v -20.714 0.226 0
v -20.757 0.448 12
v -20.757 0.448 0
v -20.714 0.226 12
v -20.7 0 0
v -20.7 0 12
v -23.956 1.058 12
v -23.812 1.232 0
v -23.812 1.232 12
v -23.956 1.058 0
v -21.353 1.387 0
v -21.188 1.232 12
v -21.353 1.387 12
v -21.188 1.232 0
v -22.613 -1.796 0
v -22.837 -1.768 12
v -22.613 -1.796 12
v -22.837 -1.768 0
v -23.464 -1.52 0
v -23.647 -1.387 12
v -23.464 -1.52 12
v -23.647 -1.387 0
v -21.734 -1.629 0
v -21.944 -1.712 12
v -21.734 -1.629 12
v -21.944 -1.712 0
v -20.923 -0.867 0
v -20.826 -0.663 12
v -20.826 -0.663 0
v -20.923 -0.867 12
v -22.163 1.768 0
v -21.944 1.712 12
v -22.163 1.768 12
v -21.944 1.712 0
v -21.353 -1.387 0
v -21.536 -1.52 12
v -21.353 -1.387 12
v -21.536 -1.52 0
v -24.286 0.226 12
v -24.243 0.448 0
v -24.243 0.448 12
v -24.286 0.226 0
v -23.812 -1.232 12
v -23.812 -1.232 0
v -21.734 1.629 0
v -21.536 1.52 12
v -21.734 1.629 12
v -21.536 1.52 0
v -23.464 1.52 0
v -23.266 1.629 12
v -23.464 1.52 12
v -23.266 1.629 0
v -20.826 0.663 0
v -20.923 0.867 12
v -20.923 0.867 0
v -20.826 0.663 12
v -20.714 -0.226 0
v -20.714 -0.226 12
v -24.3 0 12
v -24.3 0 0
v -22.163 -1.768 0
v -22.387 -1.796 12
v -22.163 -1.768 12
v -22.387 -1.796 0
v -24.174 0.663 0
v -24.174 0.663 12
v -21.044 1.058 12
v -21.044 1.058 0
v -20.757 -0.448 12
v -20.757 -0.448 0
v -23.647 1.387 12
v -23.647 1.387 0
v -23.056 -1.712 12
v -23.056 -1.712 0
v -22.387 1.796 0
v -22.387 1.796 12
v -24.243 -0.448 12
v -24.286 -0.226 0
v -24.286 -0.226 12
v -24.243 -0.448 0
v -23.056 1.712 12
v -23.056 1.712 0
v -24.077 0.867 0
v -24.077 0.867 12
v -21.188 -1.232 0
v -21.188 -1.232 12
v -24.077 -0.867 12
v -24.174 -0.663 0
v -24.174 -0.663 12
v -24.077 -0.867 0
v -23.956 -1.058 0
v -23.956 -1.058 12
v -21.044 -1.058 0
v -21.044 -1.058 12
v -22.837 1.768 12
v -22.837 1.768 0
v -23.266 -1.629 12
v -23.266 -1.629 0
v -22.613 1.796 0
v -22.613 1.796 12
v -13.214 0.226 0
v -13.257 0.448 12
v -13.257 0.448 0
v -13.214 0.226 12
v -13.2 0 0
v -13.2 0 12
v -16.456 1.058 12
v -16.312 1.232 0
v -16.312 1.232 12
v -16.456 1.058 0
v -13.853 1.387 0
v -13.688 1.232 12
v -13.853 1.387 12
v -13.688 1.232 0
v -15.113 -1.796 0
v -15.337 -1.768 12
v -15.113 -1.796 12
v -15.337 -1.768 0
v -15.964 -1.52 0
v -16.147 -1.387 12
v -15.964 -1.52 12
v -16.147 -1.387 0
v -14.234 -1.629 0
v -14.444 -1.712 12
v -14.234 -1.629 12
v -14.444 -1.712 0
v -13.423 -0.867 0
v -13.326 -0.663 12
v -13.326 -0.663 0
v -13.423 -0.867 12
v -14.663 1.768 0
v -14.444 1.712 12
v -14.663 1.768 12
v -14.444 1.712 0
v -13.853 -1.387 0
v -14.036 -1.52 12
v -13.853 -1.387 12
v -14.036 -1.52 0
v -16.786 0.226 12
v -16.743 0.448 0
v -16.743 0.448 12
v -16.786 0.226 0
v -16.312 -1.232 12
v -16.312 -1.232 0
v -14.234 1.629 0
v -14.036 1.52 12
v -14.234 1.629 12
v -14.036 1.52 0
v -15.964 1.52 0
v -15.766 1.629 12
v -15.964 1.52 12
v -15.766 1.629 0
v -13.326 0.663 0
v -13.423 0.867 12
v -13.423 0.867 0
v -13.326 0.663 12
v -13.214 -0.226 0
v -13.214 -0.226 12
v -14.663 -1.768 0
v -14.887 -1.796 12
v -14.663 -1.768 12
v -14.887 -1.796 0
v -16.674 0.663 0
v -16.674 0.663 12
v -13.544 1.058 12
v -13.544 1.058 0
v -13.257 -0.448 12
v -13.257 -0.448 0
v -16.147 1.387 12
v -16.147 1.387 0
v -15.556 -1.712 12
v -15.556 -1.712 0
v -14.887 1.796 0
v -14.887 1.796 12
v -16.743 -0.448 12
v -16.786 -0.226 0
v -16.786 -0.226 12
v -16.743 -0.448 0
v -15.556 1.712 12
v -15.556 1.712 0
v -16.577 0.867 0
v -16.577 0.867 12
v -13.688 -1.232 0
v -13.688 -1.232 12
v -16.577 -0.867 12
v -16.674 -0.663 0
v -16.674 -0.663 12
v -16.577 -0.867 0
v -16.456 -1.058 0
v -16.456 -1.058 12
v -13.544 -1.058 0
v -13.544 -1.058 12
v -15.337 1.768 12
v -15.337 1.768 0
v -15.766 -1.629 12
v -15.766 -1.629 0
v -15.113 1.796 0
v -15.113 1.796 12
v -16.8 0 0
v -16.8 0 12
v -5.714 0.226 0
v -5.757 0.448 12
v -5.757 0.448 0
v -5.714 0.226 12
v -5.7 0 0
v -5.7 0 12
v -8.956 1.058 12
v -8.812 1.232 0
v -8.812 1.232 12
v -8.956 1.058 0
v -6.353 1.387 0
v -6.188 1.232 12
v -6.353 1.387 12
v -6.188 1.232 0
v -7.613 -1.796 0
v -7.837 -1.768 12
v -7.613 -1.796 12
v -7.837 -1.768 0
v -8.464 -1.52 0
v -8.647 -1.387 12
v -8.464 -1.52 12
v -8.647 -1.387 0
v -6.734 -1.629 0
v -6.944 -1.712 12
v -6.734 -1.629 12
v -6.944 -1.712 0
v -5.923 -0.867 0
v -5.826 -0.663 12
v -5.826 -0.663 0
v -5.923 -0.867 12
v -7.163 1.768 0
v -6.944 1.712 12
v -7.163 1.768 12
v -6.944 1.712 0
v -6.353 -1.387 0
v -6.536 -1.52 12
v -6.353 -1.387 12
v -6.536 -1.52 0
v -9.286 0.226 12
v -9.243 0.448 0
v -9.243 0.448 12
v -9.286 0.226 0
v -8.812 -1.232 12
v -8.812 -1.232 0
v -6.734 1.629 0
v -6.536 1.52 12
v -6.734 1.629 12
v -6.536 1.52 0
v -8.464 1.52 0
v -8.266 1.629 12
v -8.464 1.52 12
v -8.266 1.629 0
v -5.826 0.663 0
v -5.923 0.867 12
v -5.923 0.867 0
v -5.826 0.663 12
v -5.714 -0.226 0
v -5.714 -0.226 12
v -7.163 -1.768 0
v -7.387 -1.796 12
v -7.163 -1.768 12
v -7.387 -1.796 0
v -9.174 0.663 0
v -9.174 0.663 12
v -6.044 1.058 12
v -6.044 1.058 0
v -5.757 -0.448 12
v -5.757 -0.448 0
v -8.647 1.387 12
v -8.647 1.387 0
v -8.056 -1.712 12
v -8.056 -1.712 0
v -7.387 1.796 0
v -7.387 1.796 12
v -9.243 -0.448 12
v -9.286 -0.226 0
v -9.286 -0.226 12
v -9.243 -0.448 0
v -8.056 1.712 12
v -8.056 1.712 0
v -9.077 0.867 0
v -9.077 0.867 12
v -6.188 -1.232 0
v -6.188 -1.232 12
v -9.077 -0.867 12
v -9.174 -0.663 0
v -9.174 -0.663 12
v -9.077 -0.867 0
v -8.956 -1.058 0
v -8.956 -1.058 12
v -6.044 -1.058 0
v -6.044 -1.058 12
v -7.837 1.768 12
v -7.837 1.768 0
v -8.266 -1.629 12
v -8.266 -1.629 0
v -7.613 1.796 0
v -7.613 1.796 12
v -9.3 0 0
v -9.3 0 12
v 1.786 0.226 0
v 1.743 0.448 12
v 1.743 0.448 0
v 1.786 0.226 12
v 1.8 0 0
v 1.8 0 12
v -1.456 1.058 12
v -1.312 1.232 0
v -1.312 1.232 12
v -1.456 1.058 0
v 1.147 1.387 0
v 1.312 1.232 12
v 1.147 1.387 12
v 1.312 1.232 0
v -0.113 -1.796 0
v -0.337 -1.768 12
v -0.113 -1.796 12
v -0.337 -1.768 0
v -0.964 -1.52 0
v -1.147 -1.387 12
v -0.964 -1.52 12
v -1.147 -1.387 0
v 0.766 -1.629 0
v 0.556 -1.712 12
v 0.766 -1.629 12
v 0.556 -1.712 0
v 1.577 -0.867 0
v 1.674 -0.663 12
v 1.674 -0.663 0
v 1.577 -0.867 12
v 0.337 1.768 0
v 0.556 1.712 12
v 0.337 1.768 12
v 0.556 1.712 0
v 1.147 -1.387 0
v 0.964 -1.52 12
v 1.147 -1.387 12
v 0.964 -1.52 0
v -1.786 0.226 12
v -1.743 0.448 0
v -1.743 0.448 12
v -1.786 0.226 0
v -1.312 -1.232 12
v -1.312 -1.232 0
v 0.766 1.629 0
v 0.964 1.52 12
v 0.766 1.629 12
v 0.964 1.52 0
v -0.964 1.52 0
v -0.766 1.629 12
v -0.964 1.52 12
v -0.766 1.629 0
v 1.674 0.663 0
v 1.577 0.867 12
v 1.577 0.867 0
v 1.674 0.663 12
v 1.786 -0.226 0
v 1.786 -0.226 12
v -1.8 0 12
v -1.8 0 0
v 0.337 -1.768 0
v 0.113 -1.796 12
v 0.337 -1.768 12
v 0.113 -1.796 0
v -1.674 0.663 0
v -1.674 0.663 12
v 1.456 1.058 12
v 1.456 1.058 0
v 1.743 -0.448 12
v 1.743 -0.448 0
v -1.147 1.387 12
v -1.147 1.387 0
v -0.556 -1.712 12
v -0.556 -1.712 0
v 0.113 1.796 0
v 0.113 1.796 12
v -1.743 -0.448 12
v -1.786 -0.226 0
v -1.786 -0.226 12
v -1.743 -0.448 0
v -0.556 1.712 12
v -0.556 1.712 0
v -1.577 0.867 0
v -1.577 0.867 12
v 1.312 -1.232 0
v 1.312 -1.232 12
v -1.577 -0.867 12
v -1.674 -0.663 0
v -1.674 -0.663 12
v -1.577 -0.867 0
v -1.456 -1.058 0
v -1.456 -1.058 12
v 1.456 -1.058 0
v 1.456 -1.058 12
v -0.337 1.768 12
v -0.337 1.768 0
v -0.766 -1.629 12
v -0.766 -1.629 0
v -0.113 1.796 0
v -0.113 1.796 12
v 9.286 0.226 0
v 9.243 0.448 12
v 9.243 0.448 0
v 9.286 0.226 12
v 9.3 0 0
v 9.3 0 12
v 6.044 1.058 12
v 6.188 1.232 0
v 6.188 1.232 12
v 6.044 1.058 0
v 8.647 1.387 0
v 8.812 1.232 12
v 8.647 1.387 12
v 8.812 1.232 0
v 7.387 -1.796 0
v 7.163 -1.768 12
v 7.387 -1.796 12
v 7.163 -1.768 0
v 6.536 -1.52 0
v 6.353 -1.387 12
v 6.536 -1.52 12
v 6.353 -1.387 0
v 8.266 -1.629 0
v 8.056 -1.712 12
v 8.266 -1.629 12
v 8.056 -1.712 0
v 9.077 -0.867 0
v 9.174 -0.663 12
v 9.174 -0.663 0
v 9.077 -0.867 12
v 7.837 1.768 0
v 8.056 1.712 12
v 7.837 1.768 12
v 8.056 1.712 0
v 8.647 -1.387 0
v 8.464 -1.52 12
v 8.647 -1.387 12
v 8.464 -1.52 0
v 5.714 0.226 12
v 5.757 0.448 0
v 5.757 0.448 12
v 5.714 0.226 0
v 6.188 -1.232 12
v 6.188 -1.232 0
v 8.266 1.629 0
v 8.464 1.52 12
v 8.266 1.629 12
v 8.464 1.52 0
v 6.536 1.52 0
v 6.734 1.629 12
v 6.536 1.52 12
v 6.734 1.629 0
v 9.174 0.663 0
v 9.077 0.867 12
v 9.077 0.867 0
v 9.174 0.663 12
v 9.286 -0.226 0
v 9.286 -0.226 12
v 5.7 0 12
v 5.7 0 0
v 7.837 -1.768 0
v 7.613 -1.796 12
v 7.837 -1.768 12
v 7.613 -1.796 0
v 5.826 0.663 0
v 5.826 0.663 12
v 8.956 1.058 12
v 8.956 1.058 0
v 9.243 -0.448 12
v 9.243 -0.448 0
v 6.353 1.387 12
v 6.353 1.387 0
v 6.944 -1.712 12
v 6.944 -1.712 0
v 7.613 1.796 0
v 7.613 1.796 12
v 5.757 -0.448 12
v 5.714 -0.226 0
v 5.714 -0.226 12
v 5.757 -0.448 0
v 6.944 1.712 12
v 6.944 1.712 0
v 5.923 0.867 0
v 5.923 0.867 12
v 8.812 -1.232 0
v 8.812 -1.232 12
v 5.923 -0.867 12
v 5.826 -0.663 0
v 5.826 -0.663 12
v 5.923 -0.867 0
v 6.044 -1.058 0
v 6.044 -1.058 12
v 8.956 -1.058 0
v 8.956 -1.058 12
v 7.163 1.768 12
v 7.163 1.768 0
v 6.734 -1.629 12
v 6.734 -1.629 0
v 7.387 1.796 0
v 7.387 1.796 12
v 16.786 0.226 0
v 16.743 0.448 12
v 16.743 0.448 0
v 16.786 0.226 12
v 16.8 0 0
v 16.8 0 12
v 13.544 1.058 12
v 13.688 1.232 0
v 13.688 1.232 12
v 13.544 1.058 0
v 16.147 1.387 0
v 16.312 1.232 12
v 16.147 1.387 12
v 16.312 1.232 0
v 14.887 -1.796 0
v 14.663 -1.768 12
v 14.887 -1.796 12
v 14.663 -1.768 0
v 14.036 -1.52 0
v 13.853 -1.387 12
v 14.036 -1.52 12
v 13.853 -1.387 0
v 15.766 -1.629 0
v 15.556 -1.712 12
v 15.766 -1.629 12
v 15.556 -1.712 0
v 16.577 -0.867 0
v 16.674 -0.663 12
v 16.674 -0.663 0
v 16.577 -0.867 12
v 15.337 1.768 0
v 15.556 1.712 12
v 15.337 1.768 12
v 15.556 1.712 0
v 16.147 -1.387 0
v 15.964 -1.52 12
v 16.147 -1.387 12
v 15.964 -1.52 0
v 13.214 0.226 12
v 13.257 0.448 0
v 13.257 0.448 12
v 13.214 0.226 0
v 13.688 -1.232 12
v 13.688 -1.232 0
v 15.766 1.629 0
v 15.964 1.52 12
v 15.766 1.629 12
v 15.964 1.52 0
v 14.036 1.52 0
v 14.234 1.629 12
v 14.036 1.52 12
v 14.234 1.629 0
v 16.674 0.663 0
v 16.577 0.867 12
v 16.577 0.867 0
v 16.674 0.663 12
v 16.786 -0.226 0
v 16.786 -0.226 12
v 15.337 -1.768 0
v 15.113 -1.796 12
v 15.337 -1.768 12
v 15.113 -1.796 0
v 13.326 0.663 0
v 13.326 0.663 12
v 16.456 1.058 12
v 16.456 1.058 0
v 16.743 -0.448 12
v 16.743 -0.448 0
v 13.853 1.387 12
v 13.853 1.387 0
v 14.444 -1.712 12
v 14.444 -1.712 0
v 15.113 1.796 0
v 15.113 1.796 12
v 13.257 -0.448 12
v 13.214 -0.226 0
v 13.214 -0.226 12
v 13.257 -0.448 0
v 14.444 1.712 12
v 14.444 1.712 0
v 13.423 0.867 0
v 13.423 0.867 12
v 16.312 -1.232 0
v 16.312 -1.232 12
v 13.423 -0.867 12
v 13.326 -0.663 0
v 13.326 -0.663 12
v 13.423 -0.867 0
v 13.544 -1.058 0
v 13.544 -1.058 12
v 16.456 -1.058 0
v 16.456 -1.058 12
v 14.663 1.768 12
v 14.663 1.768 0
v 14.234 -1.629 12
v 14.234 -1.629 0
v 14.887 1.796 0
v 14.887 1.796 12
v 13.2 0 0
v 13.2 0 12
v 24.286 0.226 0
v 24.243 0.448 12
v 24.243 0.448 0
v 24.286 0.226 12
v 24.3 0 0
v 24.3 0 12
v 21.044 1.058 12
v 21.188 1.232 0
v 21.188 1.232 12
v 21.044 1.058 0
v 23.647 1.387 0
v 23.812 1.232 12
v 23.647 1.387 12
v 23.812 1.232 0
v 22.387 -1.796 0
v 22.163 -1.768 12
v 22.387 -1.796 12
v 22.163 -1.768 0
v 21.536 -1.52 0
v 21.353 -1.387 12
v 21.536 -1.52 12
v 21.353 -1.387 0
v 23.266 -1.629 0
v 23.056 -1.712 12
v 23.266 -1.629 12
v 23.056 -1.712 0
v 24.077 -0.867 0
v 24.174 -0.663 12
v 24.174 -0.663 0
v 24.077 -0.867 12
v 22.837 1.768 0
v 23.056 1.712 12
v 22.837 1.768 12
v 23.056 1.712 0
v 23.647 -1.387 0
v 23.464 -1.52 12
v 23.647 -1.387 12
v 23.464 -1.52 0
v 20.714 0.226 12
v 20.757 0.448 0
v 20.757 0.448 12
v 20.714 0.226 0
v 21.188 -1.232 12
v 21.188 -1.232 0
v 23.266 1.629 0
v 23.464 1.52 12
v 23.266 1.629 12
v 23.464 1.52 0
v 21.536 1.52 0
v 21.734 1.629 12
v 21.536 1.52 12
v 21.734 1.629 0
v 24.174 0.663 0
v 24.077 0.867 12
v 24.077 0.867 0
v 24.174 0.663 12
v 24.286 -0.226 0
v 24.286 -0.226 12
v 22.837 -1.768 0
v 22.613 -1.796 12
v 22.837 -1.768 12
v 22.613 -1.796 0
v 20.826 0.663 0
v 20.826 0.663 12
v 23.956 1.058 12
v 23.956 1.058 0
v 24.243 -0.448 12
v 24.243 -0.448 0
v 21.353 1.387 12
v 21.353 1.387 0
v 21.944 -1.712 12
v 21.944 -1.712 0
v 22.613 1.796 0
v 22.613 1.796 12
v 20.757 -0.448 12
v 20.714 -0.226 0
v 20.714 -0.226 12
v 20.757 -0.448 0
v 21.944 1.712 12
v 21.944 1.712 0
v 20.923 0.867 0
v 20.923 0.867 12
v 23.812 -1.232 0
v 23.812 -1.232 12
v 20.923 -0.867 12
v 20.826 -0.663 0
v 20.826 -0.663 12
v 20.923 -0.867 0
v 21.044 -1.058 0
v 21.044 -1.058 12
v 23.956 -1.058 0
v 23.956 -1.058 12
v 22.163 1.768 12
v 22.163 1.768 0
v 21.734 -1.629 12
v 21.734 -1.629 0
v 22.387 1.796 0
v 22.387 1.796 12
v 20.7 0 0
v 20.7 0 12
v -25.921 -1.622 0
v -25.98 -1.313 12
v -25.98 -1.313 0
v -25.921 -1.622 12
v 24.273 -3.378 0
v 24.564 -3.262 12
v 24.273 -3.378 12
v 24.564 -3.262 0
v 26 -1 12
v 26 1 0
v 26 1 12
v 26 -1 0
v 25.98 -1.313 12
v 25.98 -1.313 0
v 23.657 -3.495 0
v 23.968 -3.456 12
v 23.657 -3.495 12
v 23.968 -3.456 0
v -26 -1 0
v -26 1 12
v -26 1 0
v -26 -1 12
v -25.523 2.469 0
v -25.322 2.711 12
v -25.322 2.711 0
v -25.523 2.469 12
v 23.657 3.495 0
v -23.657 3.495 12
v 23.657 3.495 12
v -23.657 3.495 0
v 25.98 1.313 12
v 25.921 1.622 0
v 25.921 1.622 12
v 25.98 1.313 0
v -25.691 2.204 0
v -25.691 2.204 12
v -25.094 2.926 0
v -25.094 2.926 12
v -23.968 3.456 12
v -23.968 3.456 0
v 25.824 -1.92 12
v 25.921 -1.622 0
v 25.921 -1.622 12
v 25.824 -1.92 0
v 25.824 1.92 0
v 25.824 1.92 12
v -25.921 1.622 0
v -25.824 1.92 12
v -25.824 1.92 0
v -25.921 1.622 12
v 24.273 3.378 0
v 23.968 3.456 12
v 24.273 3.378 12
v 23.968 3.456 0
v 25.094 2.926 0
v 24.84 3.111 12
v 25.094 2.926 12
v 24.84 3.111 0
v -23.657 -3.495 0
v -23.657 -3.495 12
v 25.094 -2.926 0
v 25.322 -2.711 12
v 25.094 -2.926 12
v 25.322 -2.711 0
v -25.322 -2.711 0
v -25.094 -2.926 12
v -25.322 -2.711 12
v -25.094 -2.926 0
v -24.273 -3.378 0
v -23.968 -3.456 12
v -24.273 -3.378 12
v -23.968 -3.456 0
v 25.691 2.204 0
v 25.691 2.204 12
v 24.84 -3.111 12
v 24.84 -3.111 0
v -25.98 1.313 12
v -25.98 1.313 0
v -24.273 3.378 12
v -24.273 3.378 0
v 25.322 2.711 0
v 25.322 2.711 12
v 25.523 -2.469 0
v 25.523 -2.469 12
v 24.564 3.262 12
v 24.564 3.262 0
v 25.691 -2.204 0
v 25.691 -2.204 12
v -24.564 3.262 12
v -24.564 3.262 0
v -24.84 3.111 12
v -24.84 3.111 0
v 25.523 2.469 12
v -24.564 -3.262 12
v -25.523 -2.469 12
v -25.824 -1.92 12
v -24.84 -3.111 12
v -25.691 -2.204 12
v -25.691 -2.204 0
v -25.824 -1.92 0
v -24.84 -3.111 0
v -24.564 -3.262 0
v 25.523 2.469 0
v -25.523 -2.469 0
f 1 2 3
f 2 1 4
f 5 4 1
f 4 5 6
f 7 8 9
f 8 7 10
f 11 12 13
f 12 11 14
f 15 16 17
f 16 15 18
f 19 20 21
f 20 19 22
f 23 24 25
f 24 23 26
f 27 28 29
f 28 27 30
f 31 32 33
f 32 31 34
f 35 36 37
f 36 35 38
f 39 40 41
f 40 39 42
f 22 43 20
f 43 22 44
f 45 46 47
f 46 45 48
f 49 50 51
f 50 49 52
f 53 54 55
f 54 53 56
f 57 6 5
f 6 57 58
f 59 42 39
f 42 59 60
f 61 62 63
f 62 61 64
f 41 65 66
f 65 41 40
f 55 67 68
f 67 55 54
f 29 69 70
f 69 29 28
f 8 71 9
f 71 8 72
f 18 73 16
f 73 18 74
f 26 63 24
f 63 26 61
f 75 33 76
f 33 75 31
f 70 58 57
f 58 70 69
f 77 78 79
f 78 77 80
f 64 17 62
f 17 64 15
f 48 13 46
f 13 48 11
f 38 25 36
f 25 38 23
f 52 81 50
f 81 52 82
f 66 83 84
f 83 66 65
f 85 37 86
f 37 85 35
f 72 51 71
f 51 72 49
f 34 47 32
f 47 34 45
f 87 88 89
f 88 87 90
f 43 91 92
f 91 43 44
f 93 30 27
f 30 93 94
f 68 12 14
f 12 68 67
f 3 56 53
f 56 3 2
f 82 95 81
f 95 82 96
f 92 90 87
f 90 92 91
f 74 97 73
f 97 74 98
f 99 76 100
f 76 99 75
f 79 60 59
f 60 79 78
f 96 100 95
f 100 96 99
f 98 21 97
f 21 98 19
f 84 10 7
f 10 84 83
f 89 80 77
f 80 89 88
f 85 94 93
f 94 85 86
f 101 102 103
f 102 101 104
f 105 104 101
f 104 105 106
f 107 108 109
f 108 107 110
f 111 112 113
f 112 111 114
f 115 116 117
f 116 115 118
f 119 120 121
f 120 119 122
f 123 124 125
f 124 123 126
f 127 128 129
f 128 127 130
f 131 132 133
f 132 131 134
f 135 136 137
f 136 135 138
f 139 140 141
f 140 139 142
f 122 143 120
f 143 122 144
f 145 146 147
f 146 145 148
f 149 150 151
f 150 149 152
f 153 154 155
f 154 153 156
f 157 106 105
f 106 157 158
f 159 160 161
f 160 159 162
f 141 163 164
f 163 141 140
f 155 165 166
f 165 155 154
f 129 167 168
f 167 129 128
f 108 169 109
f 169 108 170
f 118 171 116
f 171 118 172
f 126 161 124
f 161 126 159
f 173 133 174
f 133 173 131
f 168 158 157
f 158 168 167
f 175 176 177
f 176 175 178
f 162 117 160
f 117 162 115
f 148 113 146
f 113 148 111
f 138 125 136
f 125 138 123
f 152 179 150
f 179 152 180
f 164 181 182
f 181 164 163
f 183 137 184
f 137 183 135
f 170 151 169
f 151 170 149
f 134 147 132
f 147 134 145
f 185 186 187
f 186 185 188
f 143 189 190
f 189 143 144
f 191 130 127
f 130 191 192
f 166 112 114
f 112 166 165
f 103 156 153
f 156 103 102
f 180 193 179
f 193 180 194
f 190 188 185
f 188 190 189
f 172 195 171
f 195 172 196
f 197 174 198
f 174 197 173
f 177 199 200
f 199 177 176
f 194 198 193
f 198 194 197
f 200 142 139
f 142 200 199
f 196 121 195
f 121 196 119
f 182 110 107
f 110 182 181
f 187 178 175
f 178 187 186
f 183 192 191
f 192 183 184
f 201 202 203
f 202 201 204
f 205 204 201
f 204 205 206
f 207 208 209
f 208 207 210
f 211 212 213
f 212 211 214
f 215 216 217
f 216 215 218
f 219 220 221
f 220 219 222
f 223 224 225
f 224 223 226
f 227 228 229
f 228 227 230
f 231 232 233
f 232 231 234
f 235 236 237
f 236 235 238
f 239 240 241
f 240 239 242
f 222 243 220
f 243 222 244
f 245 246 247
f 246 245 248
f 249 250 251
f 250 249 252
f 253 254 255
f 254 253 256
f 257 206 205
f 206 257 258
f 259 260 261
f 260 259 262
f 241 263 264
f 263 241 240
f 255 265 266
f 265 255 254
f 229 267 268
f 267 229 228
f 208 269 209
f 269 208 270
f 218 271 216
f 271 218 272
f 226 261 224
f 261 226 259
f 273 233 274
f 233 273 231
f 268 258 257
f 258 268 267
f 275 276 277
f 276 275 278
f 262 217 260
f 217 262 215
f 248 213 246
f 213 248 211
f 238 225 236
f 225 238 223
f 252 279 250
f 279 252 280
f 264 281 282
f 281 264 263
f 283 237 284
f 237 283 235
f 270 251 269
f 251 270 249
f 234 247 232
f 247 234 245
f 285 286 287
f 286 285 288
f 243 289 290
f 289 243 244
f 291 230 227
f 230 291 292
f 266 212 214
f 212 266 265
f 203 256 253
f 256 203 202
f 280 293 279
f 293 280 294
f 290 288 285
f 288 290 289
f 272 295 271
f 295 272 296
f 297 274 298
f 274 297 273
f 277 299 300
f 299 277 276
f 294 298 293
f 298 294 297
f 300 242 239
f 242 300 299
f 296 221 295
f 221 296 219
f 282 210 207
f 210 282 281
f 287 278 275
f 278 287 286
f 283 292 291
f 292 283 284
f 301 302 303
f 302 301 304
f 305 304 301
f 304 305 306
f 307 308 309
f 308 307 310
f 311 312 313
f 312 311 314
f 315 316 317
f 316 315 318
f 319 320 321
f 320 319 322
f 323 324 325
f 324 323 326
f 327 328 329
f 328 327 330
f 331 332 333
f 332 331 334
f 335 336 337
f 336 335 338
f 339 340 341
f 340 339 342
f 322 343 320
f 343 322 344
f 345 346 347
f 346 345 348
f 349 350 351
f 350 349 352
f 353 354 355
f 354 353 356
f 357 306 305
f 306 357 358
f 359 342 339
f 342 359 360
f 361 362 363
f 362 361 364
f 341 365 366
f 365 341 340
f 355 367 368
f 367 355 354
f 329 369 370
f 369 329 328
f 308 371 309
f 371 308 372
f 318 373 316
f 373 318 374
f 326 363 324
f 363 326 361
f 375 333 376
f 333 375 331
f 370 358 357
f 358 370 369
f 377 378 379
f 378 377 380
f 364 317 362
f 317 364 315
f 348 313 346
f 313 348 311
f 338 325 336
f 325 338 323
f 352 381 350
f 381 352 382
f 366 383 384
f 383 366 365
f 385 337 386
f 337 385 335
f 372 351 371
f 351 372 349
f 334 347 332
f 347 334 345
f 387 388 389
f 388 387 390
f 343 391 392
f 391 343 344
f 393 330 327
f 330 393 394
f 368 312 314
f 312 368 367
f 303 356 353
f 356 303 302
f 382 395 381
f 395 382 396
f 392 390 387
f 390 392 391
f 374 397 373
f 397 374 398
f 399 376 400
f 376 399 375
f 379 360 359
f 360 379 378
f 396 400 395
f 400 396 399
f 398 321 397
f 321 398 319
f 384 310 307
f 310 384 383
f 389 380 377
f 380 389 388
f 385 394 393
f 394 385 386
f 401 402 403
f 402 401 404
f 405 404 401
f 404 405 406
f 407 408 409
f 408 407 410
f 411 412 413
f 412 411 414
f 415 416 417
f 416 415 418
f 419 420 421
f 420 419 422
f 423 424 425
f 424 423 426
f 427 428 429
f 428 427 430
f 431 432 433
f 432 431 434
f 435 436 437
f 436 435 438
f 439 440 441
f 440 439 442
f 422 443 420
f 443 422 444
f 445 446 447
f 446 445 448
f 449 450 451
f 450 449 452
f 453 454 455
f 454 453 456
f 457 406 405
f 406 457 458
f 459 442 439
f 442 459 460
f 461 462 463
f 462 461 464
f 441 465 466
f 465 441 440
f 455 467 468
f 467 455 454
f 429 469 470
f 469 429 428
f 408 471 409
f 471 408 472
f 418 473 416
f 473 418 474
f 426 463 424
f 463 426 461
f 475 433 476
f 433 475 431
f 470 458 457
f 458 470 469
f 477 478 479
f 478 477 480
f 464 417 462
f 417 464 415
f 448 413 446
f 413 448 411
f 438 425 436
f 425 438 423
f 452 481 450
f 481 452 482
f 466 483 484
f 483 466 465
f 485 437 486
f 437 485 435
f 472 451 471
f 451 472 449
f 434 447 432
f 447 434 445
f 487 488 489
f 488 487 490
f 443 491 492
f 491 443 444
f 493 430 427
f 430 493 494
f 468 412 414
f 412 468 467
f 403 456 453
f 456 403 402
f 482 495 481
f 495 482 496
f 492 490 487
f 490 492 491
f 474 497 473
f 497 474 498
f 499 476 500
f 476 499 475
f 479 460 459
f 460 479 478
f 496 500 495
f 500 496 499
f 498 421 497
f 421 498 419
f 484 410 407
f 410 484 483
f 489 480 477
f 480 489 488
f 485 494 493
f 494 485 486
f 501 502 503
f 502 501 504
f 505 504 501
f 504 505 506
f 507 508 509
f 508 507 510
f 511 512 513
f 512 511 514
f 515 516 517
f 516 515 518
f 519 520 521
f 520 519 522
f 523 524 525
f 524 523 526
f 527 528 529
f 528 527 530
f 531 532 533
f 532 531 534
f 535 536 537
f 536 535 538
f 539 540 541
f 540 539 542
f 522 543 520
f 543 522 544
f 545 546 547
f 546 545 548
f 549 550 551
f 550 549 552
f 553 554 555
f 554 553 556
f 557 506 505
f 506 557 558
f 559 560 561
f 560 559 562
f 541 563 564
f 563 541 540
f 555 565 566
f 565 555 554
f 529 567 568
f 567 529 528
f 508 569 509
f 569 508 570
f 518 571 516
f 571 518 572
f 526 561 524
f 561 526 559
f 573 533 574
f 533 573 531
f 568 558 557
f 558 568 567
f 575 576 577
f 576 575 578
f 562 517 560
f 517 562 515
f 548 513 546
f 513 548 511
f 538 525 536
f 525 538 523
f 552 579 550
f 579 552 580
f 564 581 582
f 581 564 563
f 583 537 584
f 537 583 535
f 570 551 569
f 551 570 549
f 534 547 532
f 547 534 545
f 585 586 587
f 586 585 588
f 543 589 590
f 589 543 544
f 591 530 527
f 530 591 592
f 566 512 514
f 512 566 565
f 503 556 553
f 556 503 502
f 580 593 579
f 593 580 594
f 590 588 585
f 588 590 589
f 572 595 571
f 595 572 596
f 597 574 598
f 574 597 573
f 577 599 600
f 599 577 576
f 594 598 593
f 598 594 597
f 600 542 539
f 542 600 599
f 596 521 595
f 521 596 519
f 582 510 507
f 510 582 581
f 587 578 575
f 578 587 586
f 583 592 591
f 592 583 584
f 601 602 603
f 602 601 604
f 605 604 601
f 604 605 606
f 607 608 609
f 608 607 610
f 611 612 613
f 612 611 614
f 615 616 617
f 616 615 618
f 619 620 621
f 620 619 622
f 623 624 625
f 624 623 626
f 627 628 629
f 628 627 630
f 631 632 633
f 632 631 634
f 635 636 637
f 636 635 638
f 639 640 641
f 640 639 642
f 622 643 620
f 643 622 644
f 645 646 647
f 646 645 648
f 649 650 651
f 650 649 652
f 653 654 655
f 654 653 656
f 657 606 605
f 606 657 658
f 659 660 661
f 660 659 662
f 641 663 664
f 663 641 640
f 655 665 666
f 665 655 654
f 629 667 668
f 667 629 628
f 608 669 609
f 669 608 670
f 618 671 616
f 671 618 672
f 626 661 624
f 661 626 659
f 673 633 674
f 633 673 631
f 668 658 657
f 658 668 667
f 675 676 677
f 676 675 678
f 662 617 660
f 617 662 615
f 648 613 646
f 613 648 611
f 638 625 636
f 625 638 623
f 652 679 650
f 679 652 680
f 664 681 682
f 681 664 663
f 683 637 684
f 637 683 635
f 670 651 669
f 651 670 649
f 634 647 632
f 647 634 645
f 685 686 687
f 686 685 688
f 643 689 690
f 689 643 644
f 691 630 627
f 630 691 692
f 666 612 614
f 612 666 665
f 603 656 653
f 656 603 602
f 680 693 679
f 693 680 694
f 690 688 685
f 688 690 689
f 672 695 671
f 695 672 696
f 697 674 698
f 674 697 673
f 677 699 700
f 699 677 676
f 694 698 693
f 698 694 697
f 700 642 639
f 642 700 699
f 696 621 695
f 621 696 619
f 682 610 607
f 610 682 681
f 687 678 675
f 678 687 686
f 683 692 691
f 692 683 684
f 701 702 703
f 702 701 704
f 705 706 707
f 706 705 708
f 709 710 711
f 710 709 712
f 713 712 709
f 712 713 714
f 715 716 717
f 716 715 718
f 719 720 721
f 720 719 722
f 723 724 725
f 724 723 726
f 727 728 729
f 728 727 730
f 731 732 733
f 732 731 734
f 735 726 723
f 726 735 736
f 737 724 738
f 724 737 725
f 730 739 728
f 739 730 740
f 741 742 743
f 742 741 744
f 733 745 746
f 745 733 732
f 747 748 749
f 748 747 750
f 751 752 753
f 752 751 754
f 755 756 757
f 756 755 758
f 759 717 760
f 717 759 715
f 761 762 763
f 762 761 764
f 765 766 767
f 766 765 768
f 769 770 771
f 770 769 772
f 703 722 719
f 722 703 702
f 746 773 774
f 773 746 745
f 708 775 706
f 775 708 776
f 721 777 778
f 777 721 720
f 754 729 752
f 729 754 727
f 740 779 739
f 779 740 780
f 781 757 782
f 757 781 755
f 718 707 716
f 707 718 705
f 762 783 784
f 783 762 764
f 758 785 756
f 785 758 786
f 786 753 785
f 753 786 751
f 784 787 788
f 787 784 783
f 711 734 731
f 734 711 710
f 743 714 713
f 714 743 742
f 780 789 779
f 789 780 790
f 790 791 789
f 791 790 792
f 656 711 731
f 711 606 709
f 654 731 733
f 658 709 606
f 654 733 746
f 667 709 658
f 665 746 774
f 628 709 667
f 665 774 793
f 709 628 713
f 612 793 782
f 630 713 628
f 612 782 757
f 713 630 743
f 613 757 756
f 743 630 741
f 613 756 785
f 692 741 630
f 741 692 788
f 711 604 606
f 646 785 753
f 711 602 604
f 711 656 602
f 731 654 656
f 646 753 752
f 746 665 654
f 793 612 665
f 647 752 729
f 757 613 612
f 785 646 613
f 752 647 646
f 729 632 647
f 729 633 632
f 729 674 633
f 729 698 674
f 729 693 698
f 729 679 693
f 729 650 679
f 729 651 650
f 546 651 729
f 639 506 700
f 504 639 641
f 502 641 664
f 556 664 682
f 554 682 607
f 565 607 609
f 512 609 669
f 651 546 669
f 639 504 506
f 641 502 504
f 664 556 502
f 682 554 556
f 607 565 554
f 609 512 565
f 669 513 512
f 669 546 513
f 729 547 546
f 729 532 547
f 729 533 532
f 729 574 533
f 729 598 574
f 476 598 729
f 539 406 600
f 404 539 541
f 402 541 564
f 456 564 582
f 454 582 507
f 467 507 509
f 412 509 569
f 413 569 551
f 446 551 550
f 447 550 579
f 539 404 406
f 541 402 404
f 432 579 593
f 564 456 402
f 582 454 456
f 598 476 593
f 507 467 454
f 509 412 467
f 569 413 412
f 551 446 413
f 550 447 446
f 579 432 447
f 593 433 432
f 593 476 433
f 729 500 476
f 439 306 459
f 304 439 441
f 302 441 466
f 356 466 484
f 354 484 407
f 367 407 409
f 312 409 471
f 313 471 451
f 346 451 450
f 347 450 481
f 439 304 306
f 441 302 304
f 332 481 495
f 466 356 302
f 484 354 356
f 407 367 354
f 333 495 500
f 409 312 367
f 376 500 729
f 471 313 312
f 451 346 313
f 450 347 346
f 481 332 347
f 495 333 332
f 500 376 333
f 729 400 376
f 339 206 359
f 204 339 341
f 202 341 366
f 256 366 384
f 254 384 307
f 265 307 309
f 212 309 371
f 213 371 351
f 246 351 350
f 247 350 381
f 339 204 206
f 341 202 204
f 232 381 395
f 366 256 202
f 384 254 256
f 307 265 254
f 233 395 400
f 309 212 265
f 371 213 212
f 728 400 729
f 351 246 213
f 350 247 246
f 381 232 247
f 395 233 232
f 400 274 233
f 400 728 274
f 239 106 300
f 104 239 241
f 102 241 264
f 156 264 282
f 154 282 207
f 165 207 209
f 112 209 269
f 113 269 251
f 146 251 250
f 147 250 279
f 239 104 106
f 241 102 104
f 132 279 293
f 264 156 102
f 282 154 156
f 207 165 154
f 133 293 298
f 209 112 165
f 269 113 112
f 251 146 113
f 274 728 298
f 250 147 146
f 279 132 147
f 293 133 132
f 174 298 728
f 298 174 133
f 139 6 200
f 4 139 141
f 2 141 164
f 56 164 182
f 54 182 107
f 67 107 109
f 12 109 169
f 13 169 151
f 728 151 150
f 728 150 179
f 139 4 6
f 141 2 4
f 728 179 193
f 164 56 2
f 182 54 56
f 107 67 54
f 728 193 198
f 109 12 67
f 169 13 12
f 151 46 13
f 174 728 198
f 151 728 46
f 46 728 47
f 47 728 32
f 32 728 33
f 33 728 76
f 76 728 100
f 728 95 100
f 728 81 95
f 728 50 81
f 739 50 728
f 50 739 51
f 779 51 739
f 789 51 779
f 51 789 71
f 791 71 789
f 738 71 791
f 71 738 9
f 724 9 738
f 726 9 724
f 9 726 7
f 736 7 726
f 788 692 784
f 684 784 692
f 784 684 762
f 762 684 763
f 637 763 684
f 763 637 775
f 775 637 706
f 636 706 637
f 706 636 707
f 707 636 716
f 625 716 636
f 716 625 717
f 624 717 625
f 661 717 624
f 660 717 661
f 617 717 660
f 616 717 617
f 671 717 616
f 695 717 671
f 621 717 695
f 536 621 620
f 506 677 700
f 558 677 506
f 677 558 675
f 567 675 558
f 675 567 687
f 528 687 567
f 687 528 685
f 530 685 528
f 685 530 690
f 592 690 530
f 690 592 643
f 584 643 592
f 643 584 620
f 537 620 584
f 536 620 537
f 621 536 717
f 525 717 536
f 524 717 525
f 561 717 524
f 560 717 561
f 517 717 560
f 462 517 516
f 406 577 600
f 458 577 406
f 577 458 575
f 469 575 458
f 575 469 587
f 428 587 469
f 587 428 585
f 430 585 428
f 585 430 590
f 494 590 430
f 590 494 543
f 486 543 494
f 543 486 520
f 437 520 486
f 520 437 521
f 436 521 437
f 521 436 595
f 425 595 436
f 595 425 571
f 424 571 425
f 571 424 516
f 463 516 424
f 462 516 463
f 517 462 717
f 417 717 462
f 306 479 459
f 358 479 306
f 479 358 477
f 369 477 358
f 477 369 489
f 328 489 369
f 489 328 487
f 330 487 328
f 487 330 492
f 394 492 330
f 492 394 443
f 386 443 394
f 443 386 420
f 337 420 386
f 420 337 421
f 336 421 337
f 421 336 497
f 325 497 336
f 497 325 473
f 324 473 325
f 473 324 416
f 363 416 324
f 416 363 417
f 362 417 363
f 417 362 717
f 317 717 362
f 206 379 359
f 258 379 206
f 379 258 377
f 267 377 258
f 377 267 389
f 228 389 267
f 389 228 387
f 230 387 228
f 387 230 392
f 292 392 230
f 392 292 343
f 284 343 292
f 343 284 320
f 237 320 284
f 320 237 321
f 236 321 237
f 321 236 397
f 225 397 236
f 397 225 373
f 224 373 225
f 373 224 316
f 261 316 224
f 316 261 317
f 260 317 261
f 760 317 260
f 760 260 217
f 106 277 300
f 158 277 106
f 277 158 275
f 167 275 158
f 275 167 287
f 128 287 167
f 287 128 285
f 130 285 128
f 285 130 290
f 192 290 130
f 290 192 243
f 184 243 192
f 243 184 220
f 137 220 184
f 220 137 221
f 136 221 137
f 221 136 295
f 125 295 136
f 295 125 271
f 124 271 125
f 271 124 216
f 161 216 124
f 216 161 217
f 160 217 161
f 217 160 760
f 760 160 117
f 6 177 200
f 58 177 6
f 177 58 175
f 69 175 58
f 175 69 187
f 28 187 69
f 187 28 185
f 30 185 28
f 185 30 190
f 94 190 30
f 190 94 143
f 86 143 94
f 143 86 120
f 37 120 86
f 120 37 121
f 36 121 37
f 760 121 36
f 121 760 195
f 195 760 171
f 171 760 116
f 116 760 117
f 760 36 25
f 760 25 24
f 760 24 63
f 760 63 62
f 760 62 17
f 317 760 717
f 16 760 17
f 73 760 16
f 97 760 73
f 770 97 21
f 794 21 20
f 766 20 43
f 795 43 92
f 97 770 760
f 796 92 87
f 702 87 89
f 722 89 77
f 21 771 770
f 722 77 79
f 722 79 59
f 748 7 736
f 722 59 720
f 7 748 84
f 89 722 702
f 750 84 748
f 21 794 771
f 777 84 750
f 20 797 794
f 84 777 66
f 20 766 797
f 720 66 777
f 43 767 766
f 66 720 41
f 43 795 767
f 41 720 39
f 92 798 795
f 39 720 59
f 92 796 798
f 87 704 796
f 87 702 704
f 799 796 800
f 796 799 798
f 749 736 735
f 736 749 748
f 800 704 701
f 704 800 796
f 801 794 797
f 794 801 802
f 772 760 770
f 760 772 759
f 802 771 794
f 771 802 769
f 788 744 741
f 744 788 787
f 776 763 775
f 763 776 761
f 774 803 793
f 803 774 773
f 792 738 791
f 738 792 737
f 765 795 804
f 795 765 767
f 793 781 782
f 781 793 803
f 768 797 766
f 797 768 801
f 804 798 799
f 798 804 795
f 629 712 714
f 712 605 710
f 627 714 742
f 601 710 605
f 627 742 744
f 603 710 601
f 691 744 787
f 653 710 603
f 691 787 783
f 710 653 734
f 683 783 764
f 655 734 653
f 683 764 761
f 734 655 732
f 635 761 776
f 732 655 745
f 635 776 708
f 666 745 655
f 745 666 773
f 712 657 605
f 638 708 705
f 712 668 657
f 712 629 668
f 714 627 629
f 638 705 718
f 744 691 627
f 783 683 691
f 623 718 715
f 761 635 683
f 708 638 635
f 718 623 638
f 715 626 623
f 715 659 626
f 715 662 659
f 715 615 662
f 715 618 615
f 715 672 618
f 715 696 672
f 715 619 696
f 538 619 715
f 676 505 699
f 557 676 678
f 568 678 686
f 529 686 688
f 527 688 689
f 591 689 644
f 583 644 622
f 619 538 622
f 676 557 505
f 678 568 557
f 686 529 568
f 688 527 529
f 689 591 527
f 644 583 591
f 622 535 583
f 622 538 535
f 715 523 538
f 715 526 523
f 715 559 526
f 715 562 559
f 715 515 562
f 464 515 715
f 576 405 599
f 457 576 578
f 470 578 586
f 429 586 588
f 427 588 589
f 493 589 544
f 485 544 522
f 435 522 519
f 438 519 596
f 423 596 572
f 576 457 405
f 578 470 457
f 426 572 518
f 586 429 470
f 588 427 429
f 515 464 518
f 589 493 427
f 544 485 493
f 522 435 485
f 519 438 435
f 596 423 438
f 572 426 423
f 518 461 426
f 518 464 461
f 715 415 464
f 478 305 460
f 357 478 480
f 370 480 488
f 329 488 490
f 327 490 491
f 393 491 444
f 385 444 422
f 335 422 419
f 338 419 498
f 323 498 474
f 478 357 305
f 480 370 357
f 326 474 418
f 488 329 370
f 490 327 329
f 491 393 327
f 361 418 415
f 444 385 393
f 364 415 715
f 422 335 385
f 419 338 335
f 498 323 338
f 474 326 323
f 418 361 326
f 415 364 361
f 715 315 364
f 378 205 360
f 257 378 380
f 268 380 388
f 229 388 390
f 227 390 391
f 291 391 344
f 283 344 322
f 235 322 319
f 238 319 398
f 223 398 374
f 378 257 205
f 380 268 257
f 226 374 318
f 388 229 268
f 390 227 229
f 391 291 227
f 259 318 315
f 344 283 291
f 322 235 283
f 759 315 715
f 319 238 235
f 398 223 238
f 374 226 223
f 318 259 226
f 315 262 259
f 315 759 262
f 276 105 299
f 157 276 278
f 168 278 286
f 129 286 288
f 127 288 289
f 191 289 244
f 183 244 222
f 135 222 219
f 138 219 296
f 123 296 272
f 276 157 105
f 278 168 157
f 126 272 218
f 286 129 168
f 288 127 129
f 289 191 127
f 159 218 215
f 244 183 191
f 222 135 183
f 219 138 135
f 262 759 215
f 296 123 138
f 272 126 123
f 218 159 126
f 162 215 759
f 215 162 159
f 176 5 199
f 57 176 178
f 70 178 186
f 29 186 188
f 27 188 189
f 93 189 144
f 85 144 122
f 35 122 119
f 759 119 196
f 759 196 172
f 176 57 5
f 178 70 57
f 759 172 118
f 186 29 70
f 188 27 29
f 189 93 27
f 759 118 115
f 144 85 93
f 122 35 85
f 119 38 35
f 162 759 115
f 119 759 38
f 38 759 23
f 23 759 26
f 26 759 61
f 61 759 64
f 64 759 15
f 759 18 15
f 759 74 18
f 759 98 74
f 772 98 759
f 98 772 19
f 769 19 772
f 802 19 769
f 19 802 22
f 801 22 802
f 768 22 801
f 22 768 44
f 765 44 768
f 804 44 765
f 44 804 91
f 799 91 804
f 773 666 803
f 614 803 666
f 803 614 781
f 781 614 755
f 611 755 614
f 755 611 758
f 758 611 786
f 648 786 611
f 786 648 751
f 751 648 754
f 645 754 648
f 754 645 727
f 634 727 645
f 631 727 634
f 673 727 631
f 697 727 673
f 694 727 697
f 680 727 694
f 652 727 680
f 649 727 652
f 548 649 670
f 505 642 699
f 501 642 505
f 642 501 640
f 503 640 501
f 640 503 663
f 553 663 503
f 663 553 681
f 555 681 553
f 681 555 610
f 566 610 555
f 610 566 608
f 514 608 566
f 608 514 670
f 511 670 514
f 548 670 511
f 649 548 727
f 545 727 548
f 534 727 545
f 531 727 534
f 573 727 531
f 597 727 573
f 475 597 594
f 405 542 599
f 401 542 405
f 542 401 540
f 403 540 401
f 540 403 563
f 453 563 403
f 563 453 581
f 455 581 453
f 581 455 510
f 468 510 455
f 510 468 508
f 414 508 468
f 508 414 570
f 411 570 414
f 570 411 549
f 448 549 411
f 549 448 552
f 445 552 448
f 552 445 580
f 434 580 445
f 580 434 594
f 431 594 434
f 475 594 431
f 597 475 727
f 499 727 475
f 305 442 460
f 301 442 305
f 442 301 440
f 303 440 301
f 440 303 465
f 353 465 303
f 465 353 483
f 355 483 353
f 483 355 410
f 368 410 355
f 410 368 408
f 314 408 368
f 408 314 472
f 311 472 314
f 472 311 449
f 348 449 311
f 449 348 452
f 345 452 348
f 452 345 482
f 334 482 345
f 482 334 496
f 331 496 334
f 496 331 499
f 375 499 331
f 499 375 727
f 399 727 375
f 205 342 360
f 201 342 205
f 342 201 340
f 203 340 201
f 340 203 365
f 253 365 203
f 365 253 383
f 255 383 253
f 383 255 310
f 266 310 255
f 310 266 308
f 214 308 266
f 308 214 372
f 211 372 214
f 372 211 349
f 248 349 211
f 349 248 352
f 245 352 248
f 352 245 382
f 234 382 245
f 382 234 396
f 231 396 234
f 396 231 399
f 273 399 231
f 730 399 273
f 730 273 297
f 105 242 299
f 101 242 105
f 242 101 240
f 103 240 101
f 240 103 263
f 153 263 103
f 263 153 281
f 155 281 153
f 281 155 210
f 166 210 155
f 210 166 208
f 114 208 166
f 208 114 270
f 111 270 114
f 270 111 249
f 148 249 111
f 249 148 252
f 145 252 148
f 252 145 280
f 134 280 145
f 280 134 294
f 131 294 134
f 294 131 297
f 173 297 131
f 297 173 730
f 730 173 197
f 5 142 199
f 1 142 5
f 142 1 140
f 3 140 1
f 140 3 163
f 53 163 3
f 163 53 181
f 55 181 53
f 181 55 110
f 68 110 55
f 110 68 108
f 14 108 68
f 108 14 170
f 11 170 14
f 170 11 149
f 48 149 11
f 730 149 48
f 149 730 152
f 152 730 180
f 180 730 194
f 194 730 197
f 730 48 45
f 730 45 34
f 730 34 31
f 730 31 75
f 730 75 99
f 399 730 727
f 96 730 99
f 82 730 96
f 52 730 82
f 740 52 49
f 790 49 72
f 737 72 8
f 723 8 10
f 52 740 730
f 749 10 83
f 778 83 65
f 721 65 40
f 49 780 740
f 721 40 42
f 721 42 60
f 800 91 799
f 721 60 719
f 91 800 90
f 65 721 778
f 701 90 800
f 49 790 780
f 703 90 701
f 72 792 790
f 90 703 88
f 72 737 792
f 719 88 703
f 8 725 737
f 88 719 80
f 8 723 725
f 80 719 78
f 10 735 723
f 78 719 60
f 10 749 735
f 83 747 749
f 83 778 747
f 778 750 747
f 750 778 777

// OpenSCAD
$fn = 50;


difference() {
	union() {
		translate(v = [0, 0, 0]) {
			rotate(a = [0, 0, 0]) {
				hull() {
					translate(v = [-23.5000000000, 1.0000000000, 0]) {
						rotate(a = [0, 0, 0]) {
							translate(v = [0, 0, 0]) {
								rotate(a = [0, 0, 0]) {
									cylinder(h = 12, r = 2.5000000000);
								}
							}
						}
					}
					translate(v = [23.5000000000, 1.0000000000, 0]) {
						rotate(a = [0, 0, 0]) {
							translate(v = [0, 0, 0]) {
								rotate(a = [0, 0, 0]) {
									cylinder(h = 12, r = 2.5000000000);
								}
							}
						}
					}
					translate(v = [-23.5000000000, -1.0000000000, 0]) {
						rotate(a = [0, 0, 0]) {
							translate(v = [0, 0, 0]) {
								rotate(a = [0, 0, 0]) {
									cylinder(h = 12, r = 2.5000000000);
								}
							}
						}
					}
					translate(v = [23.5000000000, -1.0000000000, 0]) {
						rotate(a = [0, 0, 0]) {
							translate(v = [0, 0, 0]) {
								rotate(a = [0, 0, 0]) {
									cylinder(h = 12, r = 2.5000000000);
								}
							}
						}
					}
				}
			}
		}
	}
	union() {
		translate(v = [-22.5000000000, 0.0000000000, 0]) {
			rotate(a = [0, 0, 0]) {
				translate(v = [0, 0, -50]) {
					rotate(a = [0, 0, 0]) {
						cylinder(h = 100, r = 1.8000000000);
					}
				}
			}
		}
		translate(v = [-15.0000000000, 0.0000000000, 0]) {
			rotate(a = [0, 0, 0]) {
				translate(v = [0, 0, -50]) {
					rotate(a = [0, 0, 0]) {
						cylinder(h = 100, r = 1.8000000000);
					}
				}
			}
		}
		translate(v = [-7.5000000000, 0.0000000000, 0]) {
			rotate(a = [0, 0, 0]) {
				translate(v = [0, 0, -50]) {
					rotate(a = [0, 0, 0]) {
						cylinder(h = 100, r = 1.8000000000);
					}
				}
			}
		}
		translate(v = [0.0000000000, 0.0000000000, 0]) {
			rotate(a = [0, 0, 0]) {
				translate(v = [0, 0, -50]) {
					rotate(a = [0, 0, 0]) {
						cylinder(h = 100, r = 1.8000000000);
					}
				}
			}
		}
		translate(v = [7.5000000000, 0.0000000000, 0]) {
			rotate(a = [0, 0, 0]) {
				translate(v = [0, 0, -50]) {
					rotate(a = [0, 0, 0]) {
						cylinder(h = 100, r = 1.8000000000);
					}
				}
			}
		}
		translate(v = [15.0000000000, 0.0000000000, 0]) {
			rotate(a = [0, 0, 0]) {
				translate(v = [0, 0, -50]) {
					rotate(a = [0, 0, 0]) {
						cylinder(h = 100, r = 1.8000000000);
					}
				}
			}
		}
		translate(v = [22.5000000000, 0.0000000000, 0]) {
			rotate(a = [0, 0, 0]) {
				translate(v = [0, 0, -50]) {
					rotate(a = [0, 0, 0]) {
						cylinder(h = 100, r = 1.8000000000);
					}
				}
			}
		}
	}
}
